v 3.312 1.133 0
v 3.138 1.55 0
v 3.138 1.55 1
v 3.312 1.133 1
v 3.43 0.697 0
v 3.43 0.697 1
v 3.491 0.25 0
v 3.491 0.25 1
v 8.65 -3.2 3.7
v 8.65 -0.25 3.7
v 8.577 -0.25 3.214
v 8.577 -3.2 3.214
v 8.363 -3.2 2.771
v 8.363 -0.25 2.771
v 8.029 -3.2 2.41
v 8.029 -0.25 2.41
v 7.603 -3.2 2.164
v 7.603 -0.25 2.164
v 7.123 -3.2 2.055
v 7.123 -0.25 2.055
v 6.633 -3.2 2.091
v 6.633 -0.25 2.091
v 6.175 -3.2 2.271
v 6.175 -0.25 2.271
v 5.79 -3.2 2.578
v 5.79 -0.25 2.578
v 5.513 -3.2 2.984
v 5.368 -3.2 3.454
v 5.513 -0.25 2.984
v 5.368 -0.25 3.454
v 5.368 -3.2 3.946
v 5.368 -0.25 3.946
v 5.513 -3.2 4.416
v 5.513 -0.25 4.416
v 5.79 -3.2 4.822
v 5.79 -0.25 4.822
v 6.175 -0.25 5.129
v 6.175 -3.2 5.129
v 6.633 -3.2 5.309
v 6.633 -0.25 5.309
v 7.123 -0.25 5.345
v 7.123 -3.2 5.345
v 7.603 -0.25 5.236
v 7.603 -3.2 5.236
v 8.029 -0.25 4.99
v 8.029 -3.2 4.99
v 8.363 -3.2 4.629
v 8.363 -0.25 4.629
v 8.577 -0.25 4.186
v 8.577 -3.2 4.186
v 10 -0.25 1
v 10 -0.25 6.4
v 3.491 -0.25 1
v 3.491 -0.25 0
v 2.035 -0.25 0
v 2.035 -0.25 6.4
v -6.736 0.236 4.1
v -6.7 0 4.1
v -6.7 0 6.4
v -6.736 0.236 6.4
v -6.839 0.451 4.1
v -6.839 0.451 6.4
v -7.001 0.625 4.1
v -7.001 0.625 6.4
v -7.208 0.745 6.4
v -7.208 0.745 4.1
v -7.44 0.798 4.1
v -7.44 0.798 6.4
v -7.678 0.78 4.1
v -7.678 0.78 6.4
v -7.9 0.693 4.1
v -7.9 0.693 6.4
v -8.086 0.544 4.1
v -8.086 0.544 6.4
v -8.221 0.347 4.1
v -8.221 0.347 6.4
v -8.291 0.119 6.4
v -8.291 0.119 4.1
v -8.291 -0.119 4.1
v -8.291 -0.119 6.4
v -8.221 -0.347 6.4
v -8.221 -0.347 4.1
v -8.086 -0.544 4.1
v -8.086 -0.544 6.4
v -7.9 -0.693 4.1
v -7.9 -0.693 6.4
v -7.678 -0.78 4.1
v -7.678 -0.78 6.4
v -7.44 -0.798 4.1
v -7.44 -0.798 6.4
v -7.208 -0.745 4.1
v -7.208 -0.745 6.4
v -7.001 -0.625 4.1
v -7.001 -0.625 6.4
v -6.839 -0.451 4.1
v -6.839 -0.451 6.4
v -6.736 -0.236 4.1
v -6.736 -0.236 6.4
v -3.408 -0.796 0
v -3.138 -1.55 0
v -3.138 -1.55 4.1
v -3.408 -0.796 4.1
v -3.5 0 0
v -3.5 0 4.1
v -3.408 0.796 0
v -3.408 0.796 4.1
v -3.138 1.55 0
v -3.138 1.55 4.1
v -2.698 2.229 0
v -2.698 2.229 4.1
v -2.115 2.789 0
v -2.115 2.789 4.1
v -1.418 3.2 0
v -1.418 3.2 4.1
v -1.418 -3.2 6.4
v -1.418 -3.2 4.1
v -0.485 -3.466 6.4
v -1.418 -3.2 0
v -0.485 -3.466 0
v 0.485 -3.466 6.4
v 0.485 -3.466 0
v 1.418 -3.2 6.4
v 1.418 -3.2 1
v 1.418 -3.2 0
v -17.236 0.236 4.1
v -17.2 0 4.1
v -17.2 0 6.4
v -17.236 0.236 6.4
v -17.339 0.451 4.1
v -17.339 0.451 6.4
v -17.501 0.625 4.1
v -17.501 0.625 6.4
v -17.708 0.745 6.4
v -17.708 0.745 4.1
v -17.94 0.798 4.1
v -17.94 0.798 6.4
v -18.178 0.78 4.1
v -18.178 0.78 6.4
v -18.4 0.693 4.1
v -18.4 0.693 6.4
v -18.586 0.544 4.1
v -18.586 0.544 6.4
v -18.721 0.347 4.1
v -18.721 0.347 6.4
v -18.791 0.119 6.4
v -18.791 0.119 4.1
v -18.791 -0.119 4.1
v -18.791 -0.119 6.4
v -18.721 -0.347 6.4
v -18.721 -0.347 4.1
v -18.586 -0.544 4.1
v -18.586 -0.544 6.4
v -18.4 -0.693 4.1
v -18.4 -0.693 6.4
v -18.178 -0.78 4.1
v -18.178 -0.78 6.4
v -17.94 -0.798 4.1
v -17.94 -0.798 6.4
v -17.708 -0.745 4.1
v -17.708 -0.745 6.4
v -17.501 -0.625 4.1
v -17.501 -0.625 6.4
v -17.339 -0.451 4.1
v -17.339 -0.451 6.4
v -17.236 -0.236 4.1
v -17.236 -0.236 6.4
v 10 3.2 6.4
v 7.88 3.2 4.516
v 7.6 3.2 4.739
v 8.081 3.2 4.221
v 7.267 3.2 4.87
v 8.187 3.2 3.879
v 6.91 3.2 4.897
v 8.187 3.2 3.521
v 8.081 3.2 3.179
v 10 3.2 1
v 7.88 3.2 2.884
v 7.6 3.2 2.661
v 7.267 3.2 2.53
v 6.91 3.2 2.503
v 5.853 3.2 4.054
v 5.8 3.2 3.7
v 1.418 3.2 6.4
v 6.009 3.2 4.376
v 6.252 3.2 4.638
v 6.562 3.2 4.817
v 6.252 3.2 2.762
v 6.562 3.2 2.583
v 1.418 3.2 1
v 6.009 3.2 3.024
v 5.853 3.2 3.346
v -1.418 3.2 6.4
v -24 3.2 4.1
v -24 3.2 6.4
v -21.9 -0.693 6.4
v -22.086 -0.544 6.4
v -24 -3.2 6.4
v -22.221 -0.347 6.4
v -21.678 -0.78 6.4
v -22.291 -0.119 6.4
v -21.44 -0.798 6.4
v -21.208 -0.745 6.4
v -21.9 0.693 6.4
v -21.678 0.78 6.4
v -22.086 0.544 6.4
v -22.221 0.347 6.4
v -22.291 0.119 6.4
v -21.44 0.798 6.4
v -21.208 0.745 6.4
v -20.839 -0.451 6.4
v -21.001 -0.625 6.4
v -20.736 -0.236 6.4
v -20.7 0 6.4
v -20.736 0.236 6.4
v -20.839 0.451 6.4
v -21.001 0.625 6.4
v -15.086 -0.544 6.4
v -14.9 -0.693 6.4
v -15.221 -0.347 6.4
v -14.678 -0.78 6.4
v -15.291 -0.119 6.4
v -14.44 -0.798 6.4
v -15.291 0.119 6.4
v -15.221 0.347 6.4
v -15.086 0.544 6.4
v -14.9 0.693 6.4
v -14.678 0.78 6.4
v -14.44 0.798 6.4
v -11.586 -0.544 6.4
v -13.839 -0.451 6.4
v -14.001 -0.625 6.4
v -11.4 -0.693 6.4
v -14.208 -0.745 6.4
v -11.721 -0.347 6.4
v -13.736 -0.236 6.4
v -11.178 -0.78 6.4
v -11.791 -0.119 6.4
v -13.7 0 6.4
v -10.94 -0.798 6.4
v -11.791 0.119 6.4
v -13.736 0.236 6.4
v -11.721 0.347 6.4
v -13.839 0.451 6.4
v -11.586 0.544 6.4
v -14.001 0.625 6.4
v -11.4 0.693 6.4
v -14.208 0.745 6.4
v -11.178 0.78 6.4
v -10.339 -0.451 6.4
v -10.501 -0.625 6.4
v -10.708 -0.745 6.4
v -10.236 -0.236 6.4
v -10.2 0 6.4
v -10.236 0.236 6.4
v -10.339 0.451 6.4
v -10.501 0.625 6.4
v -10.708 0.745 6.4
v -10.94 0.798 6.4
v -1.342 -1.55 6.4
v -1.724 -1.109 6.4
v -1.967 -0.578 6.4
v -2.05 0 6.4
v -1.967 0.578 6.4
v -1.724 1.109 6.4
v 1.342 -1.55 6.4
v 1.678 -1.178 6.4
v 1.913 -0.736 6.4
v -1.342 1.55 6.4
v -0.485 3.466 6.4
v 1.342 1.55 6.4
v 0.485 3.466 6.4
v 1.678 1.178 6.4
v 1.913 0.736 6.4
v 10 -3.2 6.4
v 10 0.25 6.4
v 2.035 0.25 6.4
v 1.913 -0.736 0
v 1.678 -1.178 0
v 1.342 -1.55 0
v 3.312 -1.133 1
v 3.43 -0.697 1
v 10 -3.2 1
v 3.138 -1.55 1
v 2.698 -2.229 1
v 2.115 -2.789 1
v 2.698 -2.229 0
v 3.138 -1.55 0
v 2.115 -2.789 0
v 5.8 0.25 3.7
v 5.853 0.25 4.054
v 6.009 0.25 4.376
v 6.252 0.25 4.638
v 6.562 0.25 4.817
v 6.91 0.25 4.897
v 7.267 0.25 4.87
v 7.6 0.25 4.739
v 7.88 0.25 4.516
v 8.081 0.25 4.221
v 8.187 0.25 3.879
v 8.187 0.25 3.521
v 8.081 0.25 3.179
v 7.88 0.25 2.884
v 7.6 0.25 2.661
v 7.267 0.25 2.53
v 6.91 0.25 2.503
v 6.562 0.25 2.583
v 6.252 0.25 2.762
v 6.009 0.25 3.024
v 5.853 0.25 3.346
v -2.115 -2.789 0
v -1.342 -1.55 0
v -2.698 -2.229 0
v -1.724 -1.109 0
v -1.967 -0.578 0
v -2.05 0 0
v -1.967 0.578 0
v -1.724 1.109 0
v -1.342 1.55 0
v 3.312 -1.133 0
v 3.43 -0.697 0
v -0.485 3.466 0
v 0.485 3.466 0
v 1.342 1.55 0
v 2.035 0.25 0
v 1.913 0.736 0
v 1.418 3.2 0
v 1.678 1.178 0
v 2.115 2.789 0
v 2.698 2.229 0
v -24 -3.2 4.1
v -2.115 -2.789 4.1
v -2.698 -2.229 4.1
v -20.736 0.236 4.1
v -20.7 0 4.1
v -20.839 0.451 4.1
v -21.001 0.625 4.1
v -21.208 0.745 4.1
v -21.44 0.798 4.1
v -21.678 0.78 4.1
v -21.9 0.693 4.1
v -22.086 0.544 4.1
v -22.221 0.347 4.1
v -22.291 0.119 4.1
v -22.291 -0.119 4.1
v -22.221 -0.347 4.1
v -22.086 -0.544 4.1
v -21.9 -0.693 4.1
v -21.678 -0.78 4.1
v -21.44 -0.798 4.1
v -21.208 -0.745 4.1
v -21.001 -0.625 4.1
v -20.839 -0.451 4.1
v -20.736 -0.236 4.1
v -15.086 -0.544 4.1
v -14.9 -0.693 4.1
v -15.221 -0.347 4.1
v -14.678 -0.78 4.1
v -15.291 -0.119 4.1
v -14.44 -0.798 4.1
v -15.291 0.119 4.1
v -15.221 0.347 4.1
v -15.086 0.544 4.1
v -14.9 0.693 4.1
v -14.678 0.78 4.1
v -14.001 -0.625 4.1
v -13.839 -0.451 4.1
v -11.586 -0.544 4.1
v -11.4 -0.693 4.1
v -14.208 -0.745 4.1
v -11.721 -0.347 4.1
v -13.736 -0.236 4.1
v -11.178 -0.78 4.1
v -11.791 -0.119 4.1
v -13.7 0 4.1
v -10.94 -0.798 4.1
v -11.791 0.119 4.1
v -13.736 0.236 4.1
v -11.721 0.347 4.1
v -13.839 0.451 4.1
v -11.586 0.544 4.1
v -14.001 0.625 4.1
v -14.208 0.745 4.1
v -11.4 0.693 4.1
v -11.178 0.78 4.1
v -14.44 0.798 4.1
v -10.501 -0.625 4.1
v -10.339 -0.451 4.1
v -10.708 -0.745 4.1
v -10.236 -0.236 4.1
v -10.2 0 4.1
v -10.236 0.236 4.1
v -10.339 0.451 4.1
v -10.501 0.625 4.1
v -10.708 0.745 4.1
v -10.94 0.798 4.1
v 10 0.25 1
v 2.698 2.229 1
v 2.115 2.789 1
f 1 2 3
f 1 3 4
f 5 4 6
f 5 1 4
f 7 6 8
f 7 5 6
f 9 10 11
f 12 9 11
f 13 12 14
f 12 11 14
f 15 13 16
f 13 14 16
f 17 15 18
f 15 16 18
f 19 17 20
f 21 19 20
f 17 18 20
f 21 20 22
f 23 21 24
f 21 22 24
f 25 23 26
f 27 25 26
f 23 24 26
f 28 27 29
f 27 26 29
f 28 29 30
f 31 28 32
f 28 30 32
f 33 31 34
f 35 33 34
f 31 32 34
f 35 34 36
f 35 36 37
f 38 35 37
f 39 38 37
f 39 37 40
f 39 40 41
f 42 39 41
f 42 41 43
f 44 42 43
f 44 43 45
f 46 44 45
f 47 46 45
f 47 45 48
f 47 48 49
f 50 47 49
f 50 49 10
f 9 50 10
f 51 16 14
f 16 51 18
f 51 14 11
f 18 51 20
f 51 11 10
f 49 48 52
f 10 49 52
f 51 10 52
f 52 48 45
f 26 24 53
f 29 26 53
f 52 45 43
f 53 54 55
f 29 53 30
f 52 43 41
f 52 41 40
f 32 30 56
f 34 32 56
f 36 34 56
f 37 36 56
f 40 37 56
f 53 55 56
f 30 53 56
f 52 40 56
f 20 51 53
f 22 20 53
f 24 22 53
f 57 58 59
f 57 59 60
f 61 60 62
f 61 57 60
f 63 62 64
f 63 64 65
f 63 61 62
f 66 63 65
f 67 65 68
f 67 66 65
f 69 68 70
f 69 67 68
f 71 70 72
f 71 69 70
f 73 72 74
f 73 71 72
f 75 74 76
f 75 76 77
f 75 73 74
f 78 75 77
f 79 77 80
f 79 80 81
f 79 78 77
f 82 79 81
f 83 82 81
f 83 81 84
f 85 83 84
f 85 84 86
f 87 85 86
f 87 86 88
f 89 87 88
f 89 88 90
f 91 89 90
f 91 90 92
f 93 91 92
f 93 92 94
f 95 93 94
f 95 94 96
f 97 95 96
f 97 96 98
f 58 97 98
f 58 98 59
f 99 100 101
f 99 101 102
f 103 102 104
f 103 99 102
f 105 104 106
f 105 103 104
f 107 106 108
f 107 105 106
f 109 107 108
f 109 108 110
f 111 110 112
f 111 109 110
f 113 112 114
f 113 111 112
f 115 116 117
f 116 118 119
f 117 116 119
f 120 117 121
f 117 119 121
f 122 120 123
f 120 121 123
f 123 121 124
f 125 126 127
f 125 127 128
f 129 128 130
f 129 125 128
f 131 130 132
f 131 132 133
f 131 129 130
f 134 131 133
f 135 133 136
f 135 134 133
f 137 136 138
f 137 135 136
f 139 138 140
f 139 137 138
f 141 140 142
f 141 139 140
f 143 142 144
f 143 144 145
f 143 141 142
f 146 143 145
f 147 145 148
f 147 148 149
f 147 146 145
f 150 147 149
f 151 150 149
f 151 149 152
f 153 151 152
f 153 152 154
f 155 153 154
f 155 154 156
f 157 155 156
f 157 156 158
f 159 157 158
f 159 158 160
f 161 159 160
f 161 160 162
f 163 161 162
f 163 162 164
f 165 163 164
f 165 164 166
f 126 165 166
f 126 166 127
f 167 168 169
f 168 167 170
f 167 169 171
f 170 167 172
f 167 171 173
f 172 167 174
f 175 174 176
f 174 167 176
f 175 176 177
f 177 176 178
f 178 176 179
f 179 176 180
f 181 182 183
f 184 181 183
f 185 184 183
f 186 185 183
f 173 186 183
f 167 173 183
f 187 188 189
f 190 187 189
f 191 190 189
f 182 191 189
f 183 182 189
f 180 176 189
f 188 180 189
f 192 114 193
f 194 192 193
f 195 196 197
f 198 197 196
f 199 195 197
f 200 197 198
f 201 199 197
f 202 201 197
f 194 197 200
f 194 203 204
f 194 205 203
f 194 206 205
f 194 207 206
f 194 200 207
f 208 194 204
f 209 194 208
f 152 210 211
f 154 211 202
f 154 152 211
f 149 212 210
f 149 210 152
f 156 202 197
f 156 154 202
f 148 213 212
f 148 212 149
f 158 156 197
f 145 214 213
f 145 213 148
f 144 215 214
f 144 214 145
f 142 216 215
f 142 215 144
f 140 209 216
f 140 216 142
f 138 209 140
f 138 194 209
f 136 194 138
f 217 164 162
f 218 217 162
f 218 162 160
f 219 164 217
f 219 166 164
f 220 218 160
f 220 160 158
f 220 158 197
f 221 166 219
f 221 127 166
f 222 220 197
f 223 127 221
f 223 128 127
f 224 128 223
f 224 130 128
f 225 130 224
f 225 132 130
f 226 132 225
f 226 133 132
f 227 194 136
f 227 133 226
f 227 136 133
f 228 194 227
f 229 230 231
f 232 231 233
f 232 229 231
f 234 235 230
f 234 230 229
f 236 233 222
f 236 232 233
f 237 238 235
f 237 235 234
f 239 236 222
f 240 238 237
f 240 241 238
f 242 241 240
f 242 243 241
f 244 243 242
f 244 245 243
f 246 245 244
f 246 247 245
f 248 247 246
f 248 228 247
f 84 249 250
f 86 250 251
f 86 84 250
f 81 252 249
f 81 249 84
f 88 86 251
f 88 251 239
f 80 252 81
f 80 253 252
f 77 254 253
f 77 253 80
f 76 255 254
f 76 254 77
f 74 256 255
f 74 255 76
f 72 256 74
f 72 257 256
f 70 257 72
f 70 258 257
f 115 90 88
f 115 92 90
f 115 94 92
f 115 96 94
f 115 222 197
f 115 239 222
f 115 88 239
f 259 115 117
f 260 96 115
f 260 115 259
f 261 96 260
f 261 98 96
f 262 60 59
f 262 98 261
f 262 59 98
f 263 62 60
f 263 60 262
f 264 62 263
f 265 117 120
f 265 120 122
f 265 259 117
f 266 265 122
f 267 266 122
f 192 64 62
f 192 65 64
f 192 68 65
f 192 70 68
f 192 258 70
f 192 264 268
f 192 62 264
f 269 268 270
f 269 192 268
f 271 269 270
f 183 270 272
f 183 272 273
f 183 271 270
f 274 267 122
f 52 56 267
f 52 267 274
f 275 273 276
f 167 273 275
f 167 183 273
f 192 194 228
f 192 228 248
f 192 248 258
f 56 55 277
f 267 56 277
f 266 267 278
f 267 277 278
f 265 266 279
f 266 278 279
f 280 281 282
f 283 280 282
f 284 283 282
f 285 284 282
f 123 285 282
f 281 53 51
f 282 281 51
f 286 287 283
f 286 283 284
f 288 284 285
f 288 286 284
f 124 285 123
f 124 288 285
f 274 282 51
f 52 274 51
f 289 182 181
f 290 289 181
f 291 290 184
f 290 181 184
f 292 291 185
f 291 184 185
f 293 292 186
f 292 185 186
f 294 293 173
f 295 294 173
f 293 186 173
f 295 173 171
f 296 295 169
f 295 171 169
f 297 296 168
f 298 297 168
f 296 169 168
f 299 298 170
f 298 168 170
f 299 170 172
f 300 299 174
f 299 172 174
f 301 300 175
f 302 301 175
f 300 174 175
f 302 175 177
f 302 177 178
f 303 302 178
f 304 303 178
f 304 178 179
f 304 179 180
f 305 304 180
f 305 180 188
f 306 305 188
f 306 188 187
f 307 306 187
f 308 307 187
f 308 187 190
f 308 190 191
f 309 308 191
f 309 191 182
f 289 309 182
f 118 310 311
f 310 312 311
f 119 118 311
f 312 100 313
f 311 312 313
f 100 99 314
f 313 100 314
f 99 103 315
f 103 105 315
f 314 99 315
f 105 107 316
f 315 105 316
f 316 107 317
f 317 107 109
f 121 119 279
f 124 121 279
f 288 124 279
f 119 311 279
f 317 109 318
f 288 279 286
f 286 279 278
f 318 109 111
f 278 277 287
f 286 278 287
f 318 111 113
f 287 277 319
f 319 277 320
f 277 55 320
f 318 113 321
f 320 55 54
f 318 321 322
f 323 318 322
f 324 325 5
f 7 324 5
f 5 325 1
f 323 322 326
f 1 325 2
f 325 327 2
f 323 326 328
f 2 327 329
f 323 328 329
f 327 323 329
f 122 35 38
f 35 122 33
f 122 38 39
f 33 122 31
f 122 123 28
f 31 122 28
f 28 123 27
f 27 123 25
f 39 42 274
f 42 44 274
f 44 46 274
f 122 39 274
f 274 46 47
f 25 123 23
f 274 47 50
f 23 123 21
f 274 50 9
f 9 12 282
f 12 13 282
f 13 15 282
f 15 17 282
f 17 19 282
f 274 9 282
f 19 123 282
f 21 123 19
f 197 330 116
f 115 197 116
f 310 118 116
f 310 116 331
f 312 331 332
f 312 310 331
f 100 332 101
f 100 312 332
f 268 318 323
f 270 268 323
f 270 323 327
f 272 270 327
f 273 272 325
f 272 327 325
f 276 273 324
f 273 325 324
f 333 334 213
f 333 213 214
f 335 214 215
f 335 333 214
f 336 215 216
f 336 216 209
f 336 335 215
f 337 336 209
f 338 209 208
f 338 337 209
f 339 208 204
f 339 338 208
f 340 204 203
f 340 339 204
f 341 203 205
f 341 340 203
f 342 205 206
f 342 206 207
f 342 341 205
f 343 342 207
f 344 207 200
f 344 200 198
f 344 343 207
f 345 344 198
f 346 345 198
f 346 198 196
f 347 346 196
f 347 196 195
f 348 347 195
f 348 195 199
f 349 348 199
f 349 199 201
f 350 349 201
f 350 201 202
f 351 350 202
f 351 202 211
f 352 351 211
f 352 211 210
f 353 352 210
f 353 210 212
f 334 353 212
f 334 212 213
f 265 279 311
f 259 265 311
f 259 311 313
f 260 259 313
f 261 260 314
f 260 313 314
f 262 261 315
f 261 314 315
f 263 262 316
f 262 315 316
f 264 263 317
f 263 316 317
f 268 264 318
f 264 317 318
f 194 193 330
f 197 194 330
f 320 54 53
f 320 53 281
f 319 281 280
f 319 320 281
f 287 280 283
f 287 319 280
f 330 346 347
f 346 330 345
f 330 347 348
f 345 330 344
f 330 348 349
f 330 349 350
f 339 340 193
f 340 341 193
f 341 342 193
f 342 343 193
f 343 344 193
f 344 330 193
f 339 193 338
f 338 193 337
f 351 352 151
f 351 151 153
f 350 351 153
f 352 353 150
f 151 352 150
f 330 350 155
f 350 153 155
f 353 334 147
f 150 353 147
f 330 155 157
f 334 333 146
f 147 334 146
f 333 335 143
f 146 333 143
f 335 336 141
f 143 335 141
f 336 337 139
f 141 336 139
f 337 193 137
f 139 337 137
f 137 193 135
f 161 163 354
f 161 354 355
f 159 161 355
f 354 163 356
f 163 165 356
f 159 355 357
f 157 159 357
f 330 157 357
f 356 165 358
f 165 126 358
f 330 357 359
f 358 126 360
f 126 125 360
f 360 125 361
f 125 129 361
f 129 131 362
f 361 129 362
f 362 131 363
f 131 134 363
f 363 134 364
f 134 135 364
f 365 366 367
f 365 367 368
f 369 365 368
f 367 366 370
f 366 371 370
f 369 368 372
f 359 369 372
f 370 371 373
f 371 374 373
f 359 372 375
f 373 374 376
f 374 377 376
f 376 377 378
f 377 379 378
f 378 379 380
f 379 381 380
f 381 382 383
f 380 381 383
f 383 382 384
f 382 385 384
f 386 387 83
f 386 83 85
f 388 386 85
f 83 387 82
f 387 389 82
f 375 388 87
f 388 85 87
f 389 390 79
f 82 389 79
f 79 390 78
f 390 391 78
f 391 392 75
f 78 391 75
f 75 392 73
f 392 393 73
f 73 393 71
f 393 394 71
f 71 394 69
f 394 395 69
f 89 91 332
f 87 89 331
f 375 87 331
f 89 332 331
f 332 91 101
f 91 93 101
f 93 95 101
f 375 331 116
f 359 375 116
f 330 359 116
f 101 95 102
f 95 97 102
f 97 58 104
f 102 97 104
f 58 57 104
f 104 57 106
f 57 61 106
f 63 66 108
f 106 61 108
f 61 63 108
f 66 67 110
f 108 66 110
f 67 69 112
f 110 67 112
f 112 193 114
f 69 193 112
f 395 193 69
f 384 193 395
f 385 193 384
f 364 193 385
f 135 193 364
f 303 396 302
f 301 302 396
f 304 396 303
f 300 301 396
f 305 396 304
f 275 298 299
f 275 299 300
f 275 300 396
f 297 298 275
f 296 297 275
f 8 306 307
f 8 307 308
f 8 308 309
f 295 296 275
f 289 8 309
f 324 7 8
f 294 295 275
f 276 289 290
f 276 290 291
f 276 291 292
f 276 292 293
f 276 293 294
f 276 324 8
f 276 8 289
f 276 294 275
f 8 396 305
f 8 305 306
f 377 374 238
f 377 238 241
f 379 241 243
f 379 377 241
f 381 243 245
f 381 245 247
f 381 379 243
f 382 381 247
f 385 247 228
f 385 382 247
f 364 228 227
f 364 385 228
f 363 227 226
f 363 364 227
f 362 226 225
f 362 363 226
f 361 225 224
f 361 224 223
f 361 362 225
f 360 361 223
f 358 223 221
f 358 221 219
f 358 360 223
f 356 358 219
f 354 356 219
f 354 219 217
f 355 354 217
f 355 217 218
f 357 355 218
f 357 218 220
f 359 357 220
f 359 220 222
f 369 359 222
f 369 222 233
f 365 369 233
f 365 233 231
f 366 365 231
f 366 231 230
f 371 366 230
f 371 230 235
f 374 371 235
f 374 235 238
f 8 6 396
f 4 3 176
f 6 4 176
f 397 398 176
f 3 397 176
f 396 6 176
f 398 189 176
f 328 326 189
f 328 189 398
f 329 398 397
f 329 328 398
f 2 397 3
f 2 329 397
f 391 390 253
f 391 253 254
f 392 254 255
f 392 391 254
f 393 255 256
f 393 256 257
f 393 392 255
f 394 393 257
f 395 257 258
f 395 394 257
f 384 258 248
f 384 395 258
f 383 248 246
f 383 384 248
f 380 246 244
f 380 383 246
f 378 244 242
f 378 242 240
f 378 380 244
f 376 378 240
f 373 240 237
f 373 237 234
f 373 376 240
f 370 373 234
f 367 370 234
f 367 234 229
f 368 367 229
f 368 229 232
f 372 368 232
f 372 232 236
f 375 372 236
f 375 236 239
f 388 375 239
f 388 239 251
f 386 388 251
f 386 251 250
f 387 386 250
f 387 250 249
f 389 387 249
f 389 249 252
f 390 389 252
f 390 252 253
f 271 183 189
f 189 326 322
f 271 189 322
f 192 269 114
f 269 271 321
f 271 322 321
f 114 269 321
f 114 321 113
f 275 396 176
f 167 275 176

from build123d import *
from build123d import SkipClean  # not in build123d's __all__

# Parameters (mm, degrees)
F0_R     = 0.8
F1_DEPTH = 6.4
F2_DEPTH = 1
F3_DEPTH = 4.1
F4_W     = 0.5
F4_H     = 15
F5_DEPTH = 25
F7_D     = 3.3
F7_DEPTH = 3.2
F7_TIP   = 0.9914200214
F8_D     = 2.4
F8_DEPTH = 3.5
F8_TIP   = 0.7210327428


with BuildPart() as f1:
    # F0 (on Top) → F1 (new body)
    with BuildSketch(Plane.XY):
        with BuildLine():
            Line((-24, -3.2), (-1.4177446879, -3.2))
            ThreePointArc((-1.4177446879, -3.2), (-2.4227036384, -2.5259665636), (-3.1380726569, -1.55))
            ThreePointArc((-3.1380726569, -1.55), (-3.5, 0), (-3.1380726569, 1.55))
            ThreePointArc((-3.1380726569, 1.55), (-2.4227036384, 2.5259665636), (-1.4177446879, 3.2))
            Line((-1.4177446879, 3.2), (-24, 3.2))
            Line((-24, 3.2), (-24, -3.2))
        make_face()
        with Locations((-21.5, 0)):
            Circle(F0_R, mode=Mode.SUBTRACT)
        with Locations((-18, 0)):
            Circle(F0_R, mode=Mode.SUBTRACT)
        with Locations((-14.5, 0)):
            Circle(F0_R, mode=Mode.SUBTRACT)
        with Locations((-11, 0)):
            Circle(F0_R, mode=Mode.SUBTRACT)
        with Locations((-7.5, 0)):
            Circle(F0_R, mode=Mode.SUBTRACT)
        with BuildLine():
            Line((-3.1380726569, -1.55), (-1.3416407865, -1.55))
            ThreePointArc((-1.3416407865, -1.55), (-2.05, 0), (-1.3416407865, 1.55))
            Line((-1.3416407865, 1.55), (-3.1380726569, 1.55))
            ThreePointArc((-3.1380726569, 1.55), (-3.5, 0), (-3.1380726569, -1.55))
        make_face()
        with BuildLine():
            ThreePointArc((1.4177446879, -3.2), (2.4227036384, -2.5259665636), (3.1380726569, -1.55))
            Line((3.1380726569, -1.55), (1.3416407865, -1.55))
            ThreePointArc((1.3416407865, -1.55), (0, -2.05), (-1.3416407865, -1.55))
            Line((-1.3416407865, -1.55), (-3.1380726569, -1.55))
            ThreePointArc((-3.1380726569, -1.55), (-2.4227036384, -2.5259665636), (-1.4177446879, -3.2))
            Line((-1.4177446879, -3.2), (1.4177446879, -3.2))
        make_face()
        with BuildLine():
            Line((1.3416407865, 1.55), (3.1380726569, 1.55))
            ThreePointArc((3.1380726569, 1.55), (2.4227036384, 2.5259665636), (1.4177446879, 3.2))
            Line((1.4177446879, 3.2), (-1.4177446879, 3.2))
            ThreePointArc((-1.4177446879, 3.2), (-2.4227036384, 2.5259665636), (-3.1380726569, 1.55))
            Line((-3.1380726569, 1.55), (-1.3416407865, 1.55))
            ThreePointArc((-1.3416407865, 1.55), (0, 2.05), (1.3416407865, 1.55))
        make_face()
        with BuildLine():
            ThreePointArc((1.3416407865, 1.55), (0, 2.05), (-1.3416407865, 1.55))
            Line((-1.3416407865, 1.55), (1.3416407865, 1.55))
        make_face()
        with BuildLine():
            ThreePointArc((-1.3416407865, -1.55), (0, -2.05), (1.3416407865, -1.55))
            Line((1.3416407865, -1.55), (-1.3416407865, -1.55))
        make_face()
        with BuildLine():
            Line((1.3416407865, -1.55), (3.1380726569, -1.55))
            ThreePointArc((3.1380726569, -1.55), (3.4083173487, -0.7958472532), (3.5, 0))
            ThreePointArc((3.5, 0), (3.4083173487, 0.7958472532), (3.1380726569, 1.55))
            Line((3.1380726569, 1.55), (1.3416407865, 1.55))
            ThreePointArc((1.3416407865, 1.55), (1.864519189, 0.8520963524), (2.05, 0))
            ThreePointArc((2.05, 0), (1.864519189, -0.8520963524), (1.3416407865, -1.55))
        make_face()
        with BuildLine():
            ThreePointArc((3.5, 0), (3.4083173487, -0.7958472532), (3.1380726569, -1.55))
            ThreePointArc((3.1380726569, -1.55), (2.4227036384, -2.5259665636), (1.4177446879, -3.2))
            Line((1.4177446879, -3.2), (10, -3.2))
            Line((10, -3.2), (10, 3.2))
            Line((10, 3.2), (1.4177446879, 3.2))
            ThreePointArc((1.4177446879, 3.2), (2.4227036384, 2.5259665636), (3.1380726569, 1.55))
            ThreePointArc((3.1380726569, 1.55), (3.4083173487, 0.7958472532), (3.5, 0))
        make_face()
        with BuildLine():
            ThreePointArc((-1.4177446879, -3.2), (0, -3.5), (1.4177446879, -3.2))
            Line((1.4177446879, -3.2), (-1.4177446879, -3.2))
        make_face()
        with BuildLine():
            Line((-1.4177446879, 3.2), (1.4177446879, 3.2))
            ThreePointArc((1.4177446879, 3.2), (0, 3.5), (-1.4177446879, 3.2))
        make_face()
    extrude(amount=F1_DEPTH)

    # F0 (on Top) → F2 (cut)
    with BuildSketch(Plane.XY):
        with BuildLine():
            ThreePointArc((3.5, 0), (3.4083173487, -0.7958472532), (3.1380726569, -1.55))
            ThreePointArc((3.1380726569, -1.55), (2.4227036384, -2.5259665636), (1.4177446879, -3.2))
            Line((1.4177446879, -3.2), (10, -3.2))
            Line((10, -3.2), (10, 3.2))
            Line((10, 3.2), (1.4177446879, 3.2))
            ThreePointArc((1.4177446879, 3.2), (2.4227036384, 2.5259665636), (3.1380726569, 1.55))
            ThreePointArc((3.1380726569, 1.55), (3.4083173487, 0.7958472532), (3.5, 0))
        make_face()
    with SkipClean():  # cleaning this boolean's faces spoils the solid; the shape is the same uncleaned
        extrude(amount=F2_DEPTH, mode=Mode.SUBTRACT)

    # F0 (on Top) → F3 (cut)
    with BuildSketch(Plane.XY):
        with BuildLine():
            Line((-24, -3.2), (-1.4177446879, -3.2))
            ThreePointArc((-1.4177446879, -3.2), (-2.4227036384, -2.5259665636), (-3.1380726569, -1.55))
            ThreePointArc((-3.1380726569, -1.55), (-3.5, 0), (-3.1380726569, 1.55))
            ThreePointArc((-3.1380726569, 1.55), (-2.4227036384, 2.5259665636), (-1.4177446879, 3.2))
            Line((-1.4177446879, 3.2), (-24, 3.2))
            Line((-24, 3.2), (-24, -3.2))
        make_face()
        with Locations((-21.5, 0)):
            Circle(F0_R, mode=Mode.SUBTRACT)
        with Locations((-18, 0)):
            Circle(F0_R, mode=Mode.SUBTRACT)
        with Locations((-14.5, 0)):
            Circle(F0_R, mode=Mode.SUBTRACT)
        with Locations((-11, 0)):
            Circle(F0_R, mode=Mode.SUBTRACT)
        with Locations((-7.5, 0)):
            Circle(F0_R, mode=Mode.SUBTRACT)
    extrude(amount=F3_DEPTH, mode=Mode.SUBTRACT)

    # F4 (on Right) → F5 (cut)
    with BuildSketch(Plane.YZ):
        Rectangle(F4_W, F4_H)
    extrude(amount=F5_DEPTH, mode=Mode.SUBTRACT)

    # F7 (one way)
    with BuildSketch(Plane(origin=(0, 0, 0), x_dir=(1, 0, 0), z_dir=(0, 1, 0))):
        with Locations((7, -3.7)):
            Circle(F7_D / 2)
    extrude(amount=-F7_DEPTH, mode=Mode.SUBTRACT)
    with Locations(Plane(origin=(0, 0, 0), x_dir=(1, 0, 0), z_dir=(0, 1, 0))):
        with Locations((7, -3.7)):
            with Locations((0, 0, -(F7_DEPTH + F7_TIP / 2))):  # 118° drill point
                Cone(0, F7_D / 2, F7_TIP, mode=Mode.SUBTRACT)

    # F8
    with Locations(Plane.XZ):
        with Locations((7, 3.7)):
            Hole(F8_D / 2, depth=F8_DEPTH)
            with Locations((0, 0, -(F8_DEPTH + F8_TIP / 2))):  # 118° drill point
                Cone(0, F8_D / 2, F8_TIP, mode=Mode.SUBTRACT)


solid = f1.part
